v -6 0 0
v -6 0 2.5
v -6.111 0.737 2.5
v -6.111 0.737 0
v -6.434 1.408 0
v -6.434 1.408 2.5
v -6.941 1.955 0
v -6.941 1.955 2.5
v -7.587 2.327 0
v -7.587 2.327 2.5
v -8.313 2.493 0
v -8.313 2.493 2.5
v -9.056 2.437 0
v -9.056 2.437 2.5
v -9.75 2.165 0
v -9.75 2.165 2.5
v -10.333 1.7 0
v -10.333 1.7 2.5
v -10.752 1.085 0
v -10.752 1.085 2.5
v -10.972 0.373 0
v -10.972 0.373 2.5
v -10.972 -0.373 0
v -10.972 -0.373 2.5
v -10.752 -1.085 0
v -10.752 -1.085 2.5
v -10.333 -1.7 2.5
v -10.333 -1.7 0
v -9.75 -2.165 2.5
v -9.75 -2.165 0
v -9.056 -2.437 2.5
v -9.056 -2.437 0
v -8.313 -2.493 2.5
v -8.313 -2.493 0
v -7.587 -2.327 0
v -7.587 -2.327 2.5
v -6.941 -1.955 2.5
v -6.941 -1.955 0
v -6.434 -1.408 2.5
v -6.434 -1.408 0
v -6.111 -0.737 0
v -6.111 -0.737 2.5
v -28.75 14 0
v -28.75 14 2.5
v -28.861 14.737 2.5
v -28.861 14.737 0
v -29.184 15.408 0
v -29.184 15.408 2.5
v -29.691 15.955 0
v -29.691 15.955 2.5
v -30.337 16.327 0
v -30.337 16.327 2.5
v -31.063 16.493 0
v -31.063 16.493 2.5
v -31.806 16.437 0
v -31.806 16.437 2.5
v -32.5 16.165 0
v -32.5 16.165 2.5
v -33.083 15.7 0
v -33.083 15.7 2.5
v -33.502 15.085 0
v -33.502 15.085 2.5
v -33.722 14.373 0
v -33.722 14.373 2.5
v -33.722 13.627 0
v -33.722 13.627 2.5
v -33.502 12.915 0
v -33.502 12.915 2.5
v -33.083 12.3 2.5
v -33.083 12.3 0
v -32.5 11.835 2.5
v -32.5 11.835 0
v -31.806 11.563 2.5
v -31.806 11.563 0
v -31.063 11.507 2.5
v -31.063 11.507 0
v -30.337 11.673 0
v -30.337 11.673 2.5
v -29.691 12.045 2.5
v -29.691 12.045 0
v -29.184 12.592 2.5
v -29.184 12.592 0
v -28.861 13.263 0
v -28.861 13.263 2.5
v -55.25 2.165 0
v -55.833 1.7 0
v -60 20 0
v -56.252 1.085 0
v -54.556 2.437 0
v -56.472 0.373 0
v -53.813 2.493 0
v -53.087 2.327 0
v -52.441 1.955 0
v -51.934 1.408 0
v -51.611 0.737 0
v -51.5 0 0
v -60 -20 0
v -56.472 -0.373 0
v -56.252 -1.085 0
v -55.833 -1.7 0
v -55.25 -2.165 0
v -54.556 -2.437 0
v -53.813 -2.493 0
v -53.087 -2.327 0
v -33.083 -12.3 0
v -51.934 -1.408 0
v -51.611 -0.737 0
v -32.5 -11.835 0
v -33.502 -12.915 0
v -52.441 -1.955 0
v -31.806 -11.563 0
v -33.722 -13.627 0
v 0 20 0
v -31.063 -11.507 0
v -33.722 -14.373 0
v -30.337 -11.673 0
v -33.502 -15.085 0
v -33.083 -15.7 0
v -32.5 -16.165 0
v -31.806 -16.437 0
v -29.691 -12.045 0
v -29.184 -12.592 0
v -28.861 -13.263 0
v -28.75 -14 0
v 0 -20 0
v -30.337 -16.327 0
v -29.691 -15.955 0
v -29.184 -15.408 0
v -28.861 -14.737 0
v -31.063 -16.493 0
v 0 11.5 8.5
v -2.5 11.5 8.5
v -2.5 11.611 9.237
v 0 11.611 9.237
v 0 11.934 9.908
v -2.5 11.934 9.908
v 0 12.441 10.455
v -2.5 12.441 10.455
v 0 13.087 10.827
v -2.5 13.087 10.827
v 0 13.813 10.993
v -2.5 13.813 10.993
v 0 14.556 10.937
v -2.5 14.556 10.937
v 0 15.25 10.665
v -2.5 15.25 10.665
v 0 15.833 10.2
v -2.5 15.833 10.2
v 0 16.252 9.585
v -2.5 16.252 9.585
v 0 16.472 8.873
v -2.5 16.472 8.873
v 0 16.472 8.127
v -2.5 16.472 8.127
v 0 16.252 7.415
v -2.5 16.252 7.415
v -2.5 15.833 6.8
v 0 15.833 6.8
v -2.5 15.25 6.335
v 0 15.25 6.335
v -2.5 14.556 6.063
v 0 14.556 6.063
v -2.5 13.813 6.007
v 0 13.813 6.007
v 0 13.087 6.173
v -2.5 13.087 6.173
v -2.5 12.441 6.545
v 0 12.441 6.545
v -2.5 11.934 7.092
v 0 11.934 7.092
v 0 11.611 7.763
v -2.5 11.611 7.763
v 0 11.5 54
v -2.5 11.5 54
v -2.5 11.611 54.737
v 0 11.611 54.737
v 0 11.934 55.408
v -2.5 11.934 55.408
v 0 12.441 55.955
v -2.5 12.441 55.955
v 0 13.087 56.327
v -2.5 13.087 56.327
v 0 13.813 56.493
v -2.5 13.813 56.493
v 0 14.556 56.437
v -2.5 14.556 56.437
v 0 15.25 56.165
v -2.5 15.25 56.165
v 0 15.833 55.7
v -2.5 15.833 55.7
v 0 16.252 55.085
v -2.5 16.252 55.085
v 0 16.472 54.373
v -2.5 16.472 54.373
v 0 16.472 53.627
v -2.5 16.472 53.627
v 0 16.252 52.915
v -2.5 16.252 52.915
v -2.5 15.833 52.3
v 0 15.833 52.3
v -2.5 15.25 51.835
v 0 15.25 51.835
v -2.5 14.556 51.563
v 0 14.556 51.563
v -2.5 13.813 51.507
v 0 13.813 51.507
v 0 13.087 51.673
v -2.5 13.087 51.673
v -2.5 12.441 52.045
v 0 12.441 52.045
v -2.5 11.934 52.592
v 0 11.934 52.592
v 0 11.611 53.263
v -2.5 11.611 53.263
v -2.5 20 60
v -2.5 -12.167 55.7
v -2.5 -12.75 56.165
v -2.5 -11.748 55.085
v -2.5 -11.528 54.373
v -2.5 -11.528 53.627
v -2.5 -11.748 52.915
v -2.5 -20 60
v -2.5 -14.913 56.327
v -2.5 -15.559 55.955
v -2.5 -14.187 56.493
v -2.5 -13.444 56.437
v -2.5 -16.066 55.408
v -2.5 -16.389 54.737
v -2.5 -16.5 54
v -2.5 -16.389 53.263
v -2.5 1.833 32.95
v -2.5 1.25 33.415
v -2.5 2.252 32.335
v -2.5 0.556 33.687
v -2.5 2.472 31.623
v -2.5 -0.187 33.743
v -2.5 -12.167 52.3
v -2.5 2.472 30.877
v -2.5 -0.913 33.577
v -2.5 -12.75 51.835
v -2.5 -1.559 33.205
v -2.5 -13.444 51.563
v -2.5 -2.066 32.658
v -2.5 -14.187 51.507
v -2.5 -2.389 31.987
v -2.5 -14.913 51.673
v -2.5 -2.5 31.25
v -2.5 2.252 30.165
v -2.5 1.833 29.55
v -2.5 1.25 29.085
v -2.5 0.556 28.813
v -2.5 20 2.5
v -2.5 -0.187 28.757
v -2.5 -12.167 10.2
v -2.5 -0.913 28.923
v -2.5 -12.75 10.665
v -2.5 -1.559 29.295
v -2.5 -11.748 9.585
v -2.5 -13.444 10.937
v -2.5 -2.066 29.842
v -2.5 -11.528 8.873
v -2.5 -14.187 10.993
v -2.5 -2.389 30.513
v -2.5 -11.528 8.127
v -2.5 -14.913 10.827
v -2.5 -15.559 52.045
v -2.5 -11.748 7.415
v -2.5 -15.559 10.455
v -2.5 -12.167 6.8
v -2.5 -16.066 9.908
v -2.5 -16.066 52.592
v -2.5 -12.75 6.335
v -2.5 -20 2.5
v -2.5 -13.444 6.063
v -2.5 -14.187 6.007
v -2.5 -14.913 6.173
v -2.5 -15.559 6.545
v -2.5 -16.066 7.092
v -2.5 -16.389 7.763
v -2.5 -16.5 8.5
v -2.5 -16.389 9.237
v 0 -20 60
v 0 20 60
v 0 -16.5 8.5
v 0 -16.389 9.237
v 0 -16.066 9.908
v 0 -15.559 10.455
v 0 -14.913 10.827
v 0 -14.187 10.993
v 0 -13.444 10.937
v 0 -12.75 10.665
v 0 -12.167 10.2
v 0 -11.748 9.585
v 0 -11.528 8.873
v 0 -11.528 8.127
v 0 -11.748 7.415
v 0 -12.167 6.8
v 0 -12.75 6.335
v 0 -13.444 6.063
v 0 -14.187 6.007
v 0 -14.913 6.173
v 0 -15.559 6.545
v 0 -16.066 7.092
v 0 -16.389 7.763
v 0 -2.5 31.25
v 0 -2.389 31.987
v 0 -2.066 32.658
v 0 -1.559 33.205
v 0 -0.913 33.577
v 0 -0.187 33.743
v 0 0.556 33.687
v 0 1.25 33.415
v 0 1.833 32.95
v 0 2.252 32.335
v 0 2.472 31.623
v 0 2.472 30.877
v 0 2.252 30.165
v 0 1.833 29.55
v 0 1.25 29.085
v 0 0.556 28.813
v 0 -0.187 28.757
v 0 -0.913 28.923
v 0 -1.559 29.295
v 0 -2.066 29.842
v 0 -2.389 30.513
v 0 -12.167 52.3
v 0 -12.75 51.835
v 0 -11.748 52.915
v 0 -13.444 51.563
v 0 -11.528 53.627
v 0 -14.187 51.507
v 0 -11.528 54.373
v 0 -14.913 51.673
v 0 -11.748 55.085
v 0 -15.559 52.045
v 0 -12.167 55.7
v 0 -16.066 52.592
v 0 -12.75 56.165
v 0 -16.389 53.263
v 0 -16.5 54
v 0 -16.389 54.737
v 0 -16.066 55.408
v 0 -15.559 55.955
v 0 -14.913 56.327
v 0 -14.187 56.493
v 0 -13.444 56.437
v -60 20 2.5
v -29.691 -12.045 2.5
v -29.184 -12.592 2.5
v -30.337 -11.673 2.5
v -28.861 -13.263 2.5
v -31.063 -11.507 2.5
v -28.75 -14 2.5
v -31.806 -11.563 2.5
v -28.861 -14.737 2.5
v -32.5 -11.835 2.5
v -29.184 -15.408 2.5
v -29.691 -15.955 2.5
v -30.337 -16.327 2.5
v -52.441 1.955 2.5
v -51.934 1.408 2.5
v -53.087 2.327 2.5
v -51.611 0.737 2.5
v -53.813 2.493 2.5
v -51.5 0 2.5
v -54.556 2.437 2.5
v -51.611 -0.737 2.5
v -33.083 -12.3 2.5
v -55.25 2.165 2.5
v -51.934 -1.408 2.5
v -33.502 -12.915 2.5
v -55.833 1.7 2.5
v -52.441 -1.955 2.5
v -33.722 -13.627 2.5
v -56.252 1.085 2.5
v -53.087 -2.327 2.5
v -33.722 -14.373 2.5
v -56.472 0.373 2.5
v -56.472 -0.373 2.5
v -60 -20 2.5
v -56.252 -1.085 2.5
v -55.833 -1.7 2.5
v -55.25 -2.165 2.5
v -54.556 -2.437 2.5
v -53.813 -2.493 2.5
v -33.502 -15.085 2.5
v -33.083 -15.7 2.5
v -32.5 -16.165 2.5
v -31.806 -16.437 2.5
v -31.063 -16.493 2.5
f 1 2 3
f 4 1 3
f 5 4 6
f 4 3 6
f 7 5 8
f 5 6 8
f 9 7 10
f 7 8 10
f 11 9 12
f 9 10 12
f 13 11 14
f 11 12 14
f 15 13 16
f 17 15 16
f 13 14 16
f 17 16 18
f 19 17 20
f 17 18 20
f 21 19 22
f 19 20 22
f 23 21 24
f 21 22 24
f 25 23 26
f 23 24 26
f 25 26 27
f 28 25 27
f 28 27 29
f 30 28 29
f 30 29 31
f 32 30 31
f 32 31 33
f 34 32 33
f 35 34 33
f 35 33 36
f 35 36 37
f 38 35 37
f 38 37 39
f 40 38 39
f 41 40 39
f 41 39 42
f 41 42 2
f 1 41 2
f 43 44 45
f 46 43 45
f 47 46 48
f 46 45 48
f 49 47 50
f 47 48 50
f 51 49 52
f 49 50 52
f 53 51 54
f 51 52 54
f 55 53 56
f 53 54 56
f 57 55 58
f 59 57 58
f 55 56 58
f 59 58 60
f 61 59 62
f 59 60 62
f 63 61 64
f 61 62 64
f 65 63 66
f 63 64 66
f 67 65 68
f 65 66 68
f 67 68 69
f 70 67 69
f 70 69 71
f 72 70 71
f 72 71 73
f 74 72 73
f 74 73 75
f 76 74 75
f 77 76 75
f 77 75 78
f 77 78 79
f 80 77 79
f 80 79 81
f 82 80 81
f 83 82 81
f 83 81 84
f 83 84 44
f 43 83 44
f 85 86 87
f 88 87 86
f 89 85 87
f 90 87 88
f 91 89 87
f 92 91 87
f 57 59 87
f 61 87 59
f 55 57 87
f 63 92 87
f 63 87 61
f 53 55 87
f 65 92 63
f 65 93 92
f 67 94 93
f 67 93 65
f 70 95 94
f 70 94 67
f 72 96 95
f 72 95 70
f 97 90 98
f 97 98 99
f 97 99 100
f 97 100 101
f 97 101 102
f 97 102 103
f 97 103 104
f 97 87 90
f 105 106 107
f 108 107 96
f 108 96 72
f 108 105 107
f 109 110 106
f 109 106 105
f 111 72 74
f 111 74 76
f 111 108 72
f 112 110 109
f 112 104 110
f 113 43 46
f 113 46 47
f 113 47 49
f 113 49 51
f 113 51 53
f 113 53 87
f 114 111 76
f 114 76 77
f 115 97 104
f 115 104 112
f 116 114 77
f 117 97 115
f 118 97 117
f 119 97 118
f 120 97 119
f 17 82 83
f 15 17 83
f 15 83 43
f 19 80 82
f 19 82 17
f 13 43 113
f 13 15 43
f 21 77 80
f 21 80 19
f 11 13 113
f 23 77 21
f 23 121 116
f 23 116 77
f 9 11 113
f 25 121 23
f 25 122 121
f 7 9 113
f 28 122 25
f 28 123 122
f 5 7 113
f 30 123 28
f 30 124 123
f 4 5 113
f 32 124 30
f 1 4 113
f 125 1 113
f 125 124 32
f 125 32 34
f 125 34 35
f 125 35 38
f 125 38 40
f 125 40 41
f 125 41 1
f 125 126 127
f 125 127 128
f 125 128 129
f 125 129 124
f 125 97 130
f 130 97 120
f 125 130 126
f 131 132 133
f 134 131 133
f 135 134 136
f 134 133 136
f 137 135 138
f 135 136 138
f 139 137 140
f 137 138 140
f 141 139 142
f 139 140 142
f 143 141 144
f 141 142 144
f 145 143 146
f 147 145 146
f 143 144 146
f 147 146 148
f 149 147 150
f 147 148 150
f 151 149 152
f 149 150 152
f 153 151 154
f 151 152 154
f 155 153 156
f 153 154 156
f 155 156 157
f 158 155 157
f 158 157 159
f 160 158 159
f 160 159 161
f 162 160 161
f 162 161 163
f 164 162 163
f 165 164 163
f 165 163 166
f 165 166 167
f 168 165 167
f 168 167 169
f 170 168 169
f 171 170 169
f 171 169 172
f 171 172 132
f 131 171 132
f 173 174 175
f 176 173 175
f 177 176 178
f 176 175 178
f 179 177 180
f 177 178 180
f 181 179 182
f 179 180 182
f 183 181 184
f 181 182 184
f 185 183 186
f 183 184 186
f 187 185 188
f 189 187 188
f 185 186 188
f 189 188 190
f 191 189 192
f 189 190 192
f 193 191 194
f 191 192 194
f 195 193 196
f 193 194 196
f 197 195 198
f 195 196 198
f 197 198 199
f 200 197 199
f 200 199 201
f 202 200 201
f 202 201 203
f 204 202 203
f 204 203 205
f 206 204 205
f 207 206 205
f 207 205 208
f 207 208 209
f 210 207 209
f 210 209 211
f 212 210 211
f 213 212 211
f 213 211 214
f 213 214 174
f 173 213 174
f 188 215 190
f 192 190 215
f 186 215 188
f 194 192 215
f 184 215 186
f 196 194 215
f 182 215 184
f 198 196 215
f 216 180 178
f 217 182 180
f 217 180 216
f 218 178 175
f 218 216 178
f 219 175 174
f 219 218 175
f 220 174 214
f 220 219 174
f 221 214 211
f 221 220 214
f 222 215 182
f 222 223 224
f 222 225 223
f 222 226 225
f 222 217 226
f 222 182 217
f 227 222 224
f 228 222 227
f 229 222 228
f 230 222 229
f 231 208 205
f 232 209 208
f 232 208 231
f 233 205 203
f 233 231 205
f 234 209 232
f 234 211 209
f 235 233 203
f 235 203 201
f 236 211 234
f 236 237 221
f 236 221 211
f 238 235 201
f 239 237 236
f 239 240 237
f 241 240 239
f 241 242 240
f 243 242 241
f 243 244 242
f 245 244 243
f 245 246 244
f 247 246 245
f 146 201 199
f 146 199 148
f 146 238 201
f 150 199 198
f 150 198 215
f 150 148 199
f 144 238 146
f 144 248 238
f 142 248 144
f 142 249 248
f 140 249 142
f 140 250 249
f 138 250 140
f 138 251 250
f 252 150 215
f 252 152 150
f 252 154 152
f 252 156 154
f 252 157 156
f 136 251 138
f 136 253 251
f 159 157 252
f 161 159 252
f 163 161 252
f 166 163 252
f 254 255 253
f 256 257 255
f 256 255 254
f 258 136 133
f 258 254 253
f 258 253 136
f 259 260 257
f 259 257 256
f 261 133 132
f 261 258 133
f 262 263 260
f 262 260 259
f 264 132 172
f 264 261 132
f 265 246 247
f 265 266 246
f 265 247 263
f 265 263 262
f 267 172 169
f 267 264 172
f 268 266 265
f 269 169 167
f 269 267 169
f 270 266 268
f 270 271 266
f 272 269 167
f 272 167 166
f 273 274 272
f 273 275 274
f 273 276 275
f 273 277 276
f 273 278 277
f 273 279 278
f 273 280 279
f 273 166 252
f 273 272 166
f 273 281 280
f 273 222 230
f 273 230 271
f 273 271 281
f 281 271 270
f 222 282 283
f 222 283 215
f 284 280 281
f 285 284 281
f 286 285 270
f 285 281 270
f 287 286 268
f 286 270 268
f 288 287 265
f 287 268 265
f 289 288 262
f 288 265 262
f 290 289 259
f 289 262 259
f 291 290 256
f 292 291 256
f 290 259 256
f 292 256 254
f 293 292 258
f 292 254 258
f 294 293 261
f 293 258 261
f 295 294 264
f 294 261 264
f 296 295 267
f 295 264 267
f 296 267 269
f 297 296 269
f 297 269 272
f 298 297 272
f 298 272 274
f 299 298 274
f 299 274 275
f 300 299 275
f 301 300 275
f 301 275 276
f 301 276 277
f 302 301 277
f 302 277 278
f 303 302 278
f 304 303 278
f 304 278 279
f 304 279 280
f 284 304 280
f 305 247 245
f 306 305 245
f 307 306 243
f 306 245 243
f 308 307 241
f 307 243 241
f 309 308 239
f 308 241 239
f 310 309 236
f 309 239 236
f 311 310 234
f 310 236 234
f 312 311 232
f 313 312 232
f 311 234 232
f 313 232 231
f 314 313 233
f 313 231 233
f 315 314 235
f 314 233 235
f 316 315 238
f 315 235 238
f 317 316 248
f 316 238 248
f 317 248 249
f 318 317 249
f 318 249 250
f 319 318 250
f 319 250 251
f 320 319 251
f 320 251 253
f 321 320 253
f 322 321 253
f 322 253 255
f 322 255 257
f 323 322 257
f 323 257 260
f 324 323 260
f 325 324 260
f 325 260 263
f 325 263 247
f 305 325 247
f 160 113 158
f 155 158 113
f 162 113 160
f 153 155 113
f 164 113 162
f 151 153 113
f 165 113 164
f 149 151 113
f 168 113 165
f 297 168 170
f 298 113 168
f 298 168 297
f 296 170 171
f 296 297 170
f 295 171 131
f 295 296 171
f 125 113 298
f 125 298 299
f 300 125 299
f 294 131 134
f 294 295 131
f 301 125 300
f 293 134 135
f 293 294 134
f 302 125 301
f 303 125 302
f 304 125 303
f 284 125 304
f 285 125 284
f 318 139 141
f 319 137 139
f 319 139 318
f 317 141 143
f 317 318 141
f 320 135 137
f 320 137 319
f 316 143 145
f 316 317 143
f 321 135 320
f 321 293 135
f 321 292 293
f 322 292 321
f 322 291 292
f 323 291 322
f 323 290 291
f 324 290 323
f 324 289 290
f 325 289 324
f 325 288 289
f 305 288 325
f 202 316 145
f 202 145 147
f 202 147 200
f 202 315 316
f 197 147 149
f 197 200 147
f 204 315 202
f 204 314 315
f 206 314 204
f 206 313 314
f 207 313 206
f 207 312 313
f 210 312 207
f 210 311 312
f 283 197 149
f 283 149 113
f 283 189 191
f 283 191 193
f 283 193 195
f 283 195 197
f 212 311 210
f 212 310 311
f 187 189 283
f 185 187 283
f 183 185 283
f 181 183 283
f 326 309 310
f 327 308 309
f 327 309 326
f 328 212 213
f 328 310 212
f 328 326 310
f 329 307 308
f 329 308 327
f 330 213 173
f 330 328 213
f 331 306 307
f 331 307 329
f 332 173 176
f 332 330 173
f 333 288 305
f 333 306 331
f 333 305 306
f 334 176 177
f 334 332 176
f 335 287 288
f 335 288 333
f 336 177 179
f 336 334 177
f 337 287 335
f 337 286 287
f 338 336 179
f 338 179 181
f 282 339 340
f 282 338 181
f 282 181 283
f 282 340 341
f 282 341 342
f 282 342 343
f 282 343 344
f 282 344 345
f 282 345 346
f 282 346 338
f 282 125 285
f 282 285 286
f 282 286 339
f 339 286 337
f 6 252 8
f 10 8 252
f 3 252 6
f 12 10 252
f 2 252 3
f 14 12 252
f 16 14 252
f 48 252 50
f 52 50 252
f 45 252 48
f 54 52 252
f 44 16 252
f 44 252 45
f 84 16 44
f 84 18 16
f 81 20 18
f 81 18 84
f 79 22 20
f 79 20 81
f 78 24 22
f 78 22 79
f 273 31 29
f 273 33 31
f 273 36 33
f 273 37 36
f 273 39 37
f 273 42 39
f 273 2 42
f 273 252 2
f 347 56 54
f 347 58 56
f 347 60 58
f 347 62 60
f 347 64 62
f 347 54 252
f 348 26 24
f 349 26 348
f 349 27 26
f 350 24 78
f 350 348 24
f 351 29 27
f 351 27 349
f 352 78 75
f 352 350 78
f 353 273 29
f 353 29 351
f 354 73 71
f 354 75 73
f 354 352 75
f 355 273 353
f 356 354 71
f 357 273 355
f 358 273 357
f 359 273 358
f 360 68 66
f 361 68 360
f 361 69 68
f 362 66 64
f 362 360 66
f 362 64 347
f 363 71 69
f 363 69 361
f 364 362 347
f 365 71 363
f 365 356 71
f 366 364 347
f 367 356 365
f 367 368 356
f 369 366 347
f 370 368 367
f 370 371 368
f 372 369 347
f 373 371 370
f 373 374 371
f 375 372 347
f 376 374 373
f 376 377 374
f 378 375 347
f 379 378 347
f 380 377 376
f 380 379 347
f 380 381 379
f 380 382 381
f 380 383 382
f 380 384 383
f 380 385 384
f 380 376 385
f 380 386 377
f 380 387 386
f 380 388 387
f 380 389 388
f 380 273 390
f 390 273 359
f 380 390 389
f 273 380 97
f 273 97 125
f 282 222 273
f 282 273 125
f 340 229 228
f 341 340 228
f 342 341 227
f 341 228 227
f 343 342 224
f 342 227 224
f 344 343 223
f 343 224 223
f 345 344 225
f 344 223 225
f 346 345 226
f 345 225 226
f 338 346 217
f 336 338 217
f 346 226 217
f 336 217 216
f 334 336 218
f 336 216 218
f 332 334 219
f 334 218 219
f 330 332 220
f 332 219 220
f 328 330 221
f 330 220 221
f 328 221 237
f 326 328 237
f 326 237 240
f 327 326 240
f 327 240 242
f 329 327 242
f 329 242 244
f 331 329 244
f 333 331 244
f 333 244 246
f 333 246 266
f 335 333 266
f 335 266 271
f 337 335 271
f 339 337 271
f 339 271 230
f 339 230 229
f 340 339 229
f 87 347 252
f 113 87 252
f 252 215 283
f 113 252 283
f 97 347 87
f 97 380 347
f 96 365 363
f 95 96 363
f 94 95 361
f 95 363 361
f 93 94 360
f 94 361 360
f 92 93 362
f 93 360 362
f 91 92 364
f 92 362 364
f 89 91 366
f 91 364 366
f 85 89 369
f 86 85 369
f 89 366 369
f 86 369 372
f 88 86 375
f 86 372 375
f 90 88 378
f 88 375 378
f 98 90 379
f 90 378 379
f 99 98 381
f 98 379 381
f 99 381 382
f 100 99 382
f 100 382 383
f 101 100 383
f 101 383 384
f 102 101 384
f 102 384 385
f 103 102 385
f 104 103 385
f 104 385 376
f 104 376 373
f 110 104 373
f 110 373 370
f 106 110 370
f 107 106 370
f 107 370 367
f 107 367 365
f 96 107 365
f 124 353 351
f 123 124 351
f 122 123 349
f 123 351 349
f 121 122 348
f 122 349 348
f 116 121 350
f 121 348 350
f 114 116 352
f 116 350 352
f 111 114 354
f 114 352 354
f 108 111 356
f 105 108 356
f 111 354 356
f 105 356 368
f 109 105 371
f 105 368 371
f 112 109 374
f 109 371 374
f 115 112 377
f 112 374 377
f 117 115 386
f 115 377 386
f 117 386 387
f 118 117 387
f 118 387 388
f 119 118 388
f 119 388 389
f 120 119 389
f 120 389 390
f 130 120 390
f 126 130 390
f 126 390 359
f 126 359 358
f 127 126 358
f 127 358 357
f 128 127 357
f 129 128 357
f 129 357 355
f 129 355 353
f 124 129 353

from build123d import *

# Parameters (mm, degrees)
F1_DEPTH = 20
F2_R     = 2.5
F3_DEPTH = 25
F4_R     = 2.5
F5_DEPTH = 25


with BuildPart() as f1:
    # F0 (on Front) → F1 (new body, symmetric)
    with BuildSketch(Plane.XZ):
        Polygon((-60, 2.5), (-60, 0), (0, 0), (0, 60), (-2.5, 60), (-2.5, 2.5), align=None)
    extrude(amount=F1_DEPTH, both=True)

    # F2 (on face) → F3 (cut)
    with BuildSketch(Plane(origin=(-2.5, 0, 0), x_dir=(0, -1, 0), z_dir=(-1, 0, 0))):
        with Locations((0, 31.25)):
            Circle(F2_R)
        with Locations((-14, 8.5)):
            Circle(F2_R)
        with Locations((-14, 54)):
            Circle(F2_R)
        with Locations((14, 54)):
            Circle(F2_R)
        with Locations((14, 8.5)):
            Circle(F2_R)
    extrude(amount=-F3_DEPTH, mode=Mode.SUBTRACT)

    # F4 (on face) → F5 (cut)
    with BuildSketch(Plane.XY.offset(2.5)):
        with Locations((-54, 0)):
            Circle(F4_R)
        with Locations((-31.25, 14)):
            Circle(F4_R)
        with Locations((-31.25, -14)):
            Circle(F4_R)
        with Locations((-8.5, 0)):
            Circle(F4_R)
    extrude(amount=-F5_DEPTH, mode=Mode.SUBTRACT)


solid = f1.part
